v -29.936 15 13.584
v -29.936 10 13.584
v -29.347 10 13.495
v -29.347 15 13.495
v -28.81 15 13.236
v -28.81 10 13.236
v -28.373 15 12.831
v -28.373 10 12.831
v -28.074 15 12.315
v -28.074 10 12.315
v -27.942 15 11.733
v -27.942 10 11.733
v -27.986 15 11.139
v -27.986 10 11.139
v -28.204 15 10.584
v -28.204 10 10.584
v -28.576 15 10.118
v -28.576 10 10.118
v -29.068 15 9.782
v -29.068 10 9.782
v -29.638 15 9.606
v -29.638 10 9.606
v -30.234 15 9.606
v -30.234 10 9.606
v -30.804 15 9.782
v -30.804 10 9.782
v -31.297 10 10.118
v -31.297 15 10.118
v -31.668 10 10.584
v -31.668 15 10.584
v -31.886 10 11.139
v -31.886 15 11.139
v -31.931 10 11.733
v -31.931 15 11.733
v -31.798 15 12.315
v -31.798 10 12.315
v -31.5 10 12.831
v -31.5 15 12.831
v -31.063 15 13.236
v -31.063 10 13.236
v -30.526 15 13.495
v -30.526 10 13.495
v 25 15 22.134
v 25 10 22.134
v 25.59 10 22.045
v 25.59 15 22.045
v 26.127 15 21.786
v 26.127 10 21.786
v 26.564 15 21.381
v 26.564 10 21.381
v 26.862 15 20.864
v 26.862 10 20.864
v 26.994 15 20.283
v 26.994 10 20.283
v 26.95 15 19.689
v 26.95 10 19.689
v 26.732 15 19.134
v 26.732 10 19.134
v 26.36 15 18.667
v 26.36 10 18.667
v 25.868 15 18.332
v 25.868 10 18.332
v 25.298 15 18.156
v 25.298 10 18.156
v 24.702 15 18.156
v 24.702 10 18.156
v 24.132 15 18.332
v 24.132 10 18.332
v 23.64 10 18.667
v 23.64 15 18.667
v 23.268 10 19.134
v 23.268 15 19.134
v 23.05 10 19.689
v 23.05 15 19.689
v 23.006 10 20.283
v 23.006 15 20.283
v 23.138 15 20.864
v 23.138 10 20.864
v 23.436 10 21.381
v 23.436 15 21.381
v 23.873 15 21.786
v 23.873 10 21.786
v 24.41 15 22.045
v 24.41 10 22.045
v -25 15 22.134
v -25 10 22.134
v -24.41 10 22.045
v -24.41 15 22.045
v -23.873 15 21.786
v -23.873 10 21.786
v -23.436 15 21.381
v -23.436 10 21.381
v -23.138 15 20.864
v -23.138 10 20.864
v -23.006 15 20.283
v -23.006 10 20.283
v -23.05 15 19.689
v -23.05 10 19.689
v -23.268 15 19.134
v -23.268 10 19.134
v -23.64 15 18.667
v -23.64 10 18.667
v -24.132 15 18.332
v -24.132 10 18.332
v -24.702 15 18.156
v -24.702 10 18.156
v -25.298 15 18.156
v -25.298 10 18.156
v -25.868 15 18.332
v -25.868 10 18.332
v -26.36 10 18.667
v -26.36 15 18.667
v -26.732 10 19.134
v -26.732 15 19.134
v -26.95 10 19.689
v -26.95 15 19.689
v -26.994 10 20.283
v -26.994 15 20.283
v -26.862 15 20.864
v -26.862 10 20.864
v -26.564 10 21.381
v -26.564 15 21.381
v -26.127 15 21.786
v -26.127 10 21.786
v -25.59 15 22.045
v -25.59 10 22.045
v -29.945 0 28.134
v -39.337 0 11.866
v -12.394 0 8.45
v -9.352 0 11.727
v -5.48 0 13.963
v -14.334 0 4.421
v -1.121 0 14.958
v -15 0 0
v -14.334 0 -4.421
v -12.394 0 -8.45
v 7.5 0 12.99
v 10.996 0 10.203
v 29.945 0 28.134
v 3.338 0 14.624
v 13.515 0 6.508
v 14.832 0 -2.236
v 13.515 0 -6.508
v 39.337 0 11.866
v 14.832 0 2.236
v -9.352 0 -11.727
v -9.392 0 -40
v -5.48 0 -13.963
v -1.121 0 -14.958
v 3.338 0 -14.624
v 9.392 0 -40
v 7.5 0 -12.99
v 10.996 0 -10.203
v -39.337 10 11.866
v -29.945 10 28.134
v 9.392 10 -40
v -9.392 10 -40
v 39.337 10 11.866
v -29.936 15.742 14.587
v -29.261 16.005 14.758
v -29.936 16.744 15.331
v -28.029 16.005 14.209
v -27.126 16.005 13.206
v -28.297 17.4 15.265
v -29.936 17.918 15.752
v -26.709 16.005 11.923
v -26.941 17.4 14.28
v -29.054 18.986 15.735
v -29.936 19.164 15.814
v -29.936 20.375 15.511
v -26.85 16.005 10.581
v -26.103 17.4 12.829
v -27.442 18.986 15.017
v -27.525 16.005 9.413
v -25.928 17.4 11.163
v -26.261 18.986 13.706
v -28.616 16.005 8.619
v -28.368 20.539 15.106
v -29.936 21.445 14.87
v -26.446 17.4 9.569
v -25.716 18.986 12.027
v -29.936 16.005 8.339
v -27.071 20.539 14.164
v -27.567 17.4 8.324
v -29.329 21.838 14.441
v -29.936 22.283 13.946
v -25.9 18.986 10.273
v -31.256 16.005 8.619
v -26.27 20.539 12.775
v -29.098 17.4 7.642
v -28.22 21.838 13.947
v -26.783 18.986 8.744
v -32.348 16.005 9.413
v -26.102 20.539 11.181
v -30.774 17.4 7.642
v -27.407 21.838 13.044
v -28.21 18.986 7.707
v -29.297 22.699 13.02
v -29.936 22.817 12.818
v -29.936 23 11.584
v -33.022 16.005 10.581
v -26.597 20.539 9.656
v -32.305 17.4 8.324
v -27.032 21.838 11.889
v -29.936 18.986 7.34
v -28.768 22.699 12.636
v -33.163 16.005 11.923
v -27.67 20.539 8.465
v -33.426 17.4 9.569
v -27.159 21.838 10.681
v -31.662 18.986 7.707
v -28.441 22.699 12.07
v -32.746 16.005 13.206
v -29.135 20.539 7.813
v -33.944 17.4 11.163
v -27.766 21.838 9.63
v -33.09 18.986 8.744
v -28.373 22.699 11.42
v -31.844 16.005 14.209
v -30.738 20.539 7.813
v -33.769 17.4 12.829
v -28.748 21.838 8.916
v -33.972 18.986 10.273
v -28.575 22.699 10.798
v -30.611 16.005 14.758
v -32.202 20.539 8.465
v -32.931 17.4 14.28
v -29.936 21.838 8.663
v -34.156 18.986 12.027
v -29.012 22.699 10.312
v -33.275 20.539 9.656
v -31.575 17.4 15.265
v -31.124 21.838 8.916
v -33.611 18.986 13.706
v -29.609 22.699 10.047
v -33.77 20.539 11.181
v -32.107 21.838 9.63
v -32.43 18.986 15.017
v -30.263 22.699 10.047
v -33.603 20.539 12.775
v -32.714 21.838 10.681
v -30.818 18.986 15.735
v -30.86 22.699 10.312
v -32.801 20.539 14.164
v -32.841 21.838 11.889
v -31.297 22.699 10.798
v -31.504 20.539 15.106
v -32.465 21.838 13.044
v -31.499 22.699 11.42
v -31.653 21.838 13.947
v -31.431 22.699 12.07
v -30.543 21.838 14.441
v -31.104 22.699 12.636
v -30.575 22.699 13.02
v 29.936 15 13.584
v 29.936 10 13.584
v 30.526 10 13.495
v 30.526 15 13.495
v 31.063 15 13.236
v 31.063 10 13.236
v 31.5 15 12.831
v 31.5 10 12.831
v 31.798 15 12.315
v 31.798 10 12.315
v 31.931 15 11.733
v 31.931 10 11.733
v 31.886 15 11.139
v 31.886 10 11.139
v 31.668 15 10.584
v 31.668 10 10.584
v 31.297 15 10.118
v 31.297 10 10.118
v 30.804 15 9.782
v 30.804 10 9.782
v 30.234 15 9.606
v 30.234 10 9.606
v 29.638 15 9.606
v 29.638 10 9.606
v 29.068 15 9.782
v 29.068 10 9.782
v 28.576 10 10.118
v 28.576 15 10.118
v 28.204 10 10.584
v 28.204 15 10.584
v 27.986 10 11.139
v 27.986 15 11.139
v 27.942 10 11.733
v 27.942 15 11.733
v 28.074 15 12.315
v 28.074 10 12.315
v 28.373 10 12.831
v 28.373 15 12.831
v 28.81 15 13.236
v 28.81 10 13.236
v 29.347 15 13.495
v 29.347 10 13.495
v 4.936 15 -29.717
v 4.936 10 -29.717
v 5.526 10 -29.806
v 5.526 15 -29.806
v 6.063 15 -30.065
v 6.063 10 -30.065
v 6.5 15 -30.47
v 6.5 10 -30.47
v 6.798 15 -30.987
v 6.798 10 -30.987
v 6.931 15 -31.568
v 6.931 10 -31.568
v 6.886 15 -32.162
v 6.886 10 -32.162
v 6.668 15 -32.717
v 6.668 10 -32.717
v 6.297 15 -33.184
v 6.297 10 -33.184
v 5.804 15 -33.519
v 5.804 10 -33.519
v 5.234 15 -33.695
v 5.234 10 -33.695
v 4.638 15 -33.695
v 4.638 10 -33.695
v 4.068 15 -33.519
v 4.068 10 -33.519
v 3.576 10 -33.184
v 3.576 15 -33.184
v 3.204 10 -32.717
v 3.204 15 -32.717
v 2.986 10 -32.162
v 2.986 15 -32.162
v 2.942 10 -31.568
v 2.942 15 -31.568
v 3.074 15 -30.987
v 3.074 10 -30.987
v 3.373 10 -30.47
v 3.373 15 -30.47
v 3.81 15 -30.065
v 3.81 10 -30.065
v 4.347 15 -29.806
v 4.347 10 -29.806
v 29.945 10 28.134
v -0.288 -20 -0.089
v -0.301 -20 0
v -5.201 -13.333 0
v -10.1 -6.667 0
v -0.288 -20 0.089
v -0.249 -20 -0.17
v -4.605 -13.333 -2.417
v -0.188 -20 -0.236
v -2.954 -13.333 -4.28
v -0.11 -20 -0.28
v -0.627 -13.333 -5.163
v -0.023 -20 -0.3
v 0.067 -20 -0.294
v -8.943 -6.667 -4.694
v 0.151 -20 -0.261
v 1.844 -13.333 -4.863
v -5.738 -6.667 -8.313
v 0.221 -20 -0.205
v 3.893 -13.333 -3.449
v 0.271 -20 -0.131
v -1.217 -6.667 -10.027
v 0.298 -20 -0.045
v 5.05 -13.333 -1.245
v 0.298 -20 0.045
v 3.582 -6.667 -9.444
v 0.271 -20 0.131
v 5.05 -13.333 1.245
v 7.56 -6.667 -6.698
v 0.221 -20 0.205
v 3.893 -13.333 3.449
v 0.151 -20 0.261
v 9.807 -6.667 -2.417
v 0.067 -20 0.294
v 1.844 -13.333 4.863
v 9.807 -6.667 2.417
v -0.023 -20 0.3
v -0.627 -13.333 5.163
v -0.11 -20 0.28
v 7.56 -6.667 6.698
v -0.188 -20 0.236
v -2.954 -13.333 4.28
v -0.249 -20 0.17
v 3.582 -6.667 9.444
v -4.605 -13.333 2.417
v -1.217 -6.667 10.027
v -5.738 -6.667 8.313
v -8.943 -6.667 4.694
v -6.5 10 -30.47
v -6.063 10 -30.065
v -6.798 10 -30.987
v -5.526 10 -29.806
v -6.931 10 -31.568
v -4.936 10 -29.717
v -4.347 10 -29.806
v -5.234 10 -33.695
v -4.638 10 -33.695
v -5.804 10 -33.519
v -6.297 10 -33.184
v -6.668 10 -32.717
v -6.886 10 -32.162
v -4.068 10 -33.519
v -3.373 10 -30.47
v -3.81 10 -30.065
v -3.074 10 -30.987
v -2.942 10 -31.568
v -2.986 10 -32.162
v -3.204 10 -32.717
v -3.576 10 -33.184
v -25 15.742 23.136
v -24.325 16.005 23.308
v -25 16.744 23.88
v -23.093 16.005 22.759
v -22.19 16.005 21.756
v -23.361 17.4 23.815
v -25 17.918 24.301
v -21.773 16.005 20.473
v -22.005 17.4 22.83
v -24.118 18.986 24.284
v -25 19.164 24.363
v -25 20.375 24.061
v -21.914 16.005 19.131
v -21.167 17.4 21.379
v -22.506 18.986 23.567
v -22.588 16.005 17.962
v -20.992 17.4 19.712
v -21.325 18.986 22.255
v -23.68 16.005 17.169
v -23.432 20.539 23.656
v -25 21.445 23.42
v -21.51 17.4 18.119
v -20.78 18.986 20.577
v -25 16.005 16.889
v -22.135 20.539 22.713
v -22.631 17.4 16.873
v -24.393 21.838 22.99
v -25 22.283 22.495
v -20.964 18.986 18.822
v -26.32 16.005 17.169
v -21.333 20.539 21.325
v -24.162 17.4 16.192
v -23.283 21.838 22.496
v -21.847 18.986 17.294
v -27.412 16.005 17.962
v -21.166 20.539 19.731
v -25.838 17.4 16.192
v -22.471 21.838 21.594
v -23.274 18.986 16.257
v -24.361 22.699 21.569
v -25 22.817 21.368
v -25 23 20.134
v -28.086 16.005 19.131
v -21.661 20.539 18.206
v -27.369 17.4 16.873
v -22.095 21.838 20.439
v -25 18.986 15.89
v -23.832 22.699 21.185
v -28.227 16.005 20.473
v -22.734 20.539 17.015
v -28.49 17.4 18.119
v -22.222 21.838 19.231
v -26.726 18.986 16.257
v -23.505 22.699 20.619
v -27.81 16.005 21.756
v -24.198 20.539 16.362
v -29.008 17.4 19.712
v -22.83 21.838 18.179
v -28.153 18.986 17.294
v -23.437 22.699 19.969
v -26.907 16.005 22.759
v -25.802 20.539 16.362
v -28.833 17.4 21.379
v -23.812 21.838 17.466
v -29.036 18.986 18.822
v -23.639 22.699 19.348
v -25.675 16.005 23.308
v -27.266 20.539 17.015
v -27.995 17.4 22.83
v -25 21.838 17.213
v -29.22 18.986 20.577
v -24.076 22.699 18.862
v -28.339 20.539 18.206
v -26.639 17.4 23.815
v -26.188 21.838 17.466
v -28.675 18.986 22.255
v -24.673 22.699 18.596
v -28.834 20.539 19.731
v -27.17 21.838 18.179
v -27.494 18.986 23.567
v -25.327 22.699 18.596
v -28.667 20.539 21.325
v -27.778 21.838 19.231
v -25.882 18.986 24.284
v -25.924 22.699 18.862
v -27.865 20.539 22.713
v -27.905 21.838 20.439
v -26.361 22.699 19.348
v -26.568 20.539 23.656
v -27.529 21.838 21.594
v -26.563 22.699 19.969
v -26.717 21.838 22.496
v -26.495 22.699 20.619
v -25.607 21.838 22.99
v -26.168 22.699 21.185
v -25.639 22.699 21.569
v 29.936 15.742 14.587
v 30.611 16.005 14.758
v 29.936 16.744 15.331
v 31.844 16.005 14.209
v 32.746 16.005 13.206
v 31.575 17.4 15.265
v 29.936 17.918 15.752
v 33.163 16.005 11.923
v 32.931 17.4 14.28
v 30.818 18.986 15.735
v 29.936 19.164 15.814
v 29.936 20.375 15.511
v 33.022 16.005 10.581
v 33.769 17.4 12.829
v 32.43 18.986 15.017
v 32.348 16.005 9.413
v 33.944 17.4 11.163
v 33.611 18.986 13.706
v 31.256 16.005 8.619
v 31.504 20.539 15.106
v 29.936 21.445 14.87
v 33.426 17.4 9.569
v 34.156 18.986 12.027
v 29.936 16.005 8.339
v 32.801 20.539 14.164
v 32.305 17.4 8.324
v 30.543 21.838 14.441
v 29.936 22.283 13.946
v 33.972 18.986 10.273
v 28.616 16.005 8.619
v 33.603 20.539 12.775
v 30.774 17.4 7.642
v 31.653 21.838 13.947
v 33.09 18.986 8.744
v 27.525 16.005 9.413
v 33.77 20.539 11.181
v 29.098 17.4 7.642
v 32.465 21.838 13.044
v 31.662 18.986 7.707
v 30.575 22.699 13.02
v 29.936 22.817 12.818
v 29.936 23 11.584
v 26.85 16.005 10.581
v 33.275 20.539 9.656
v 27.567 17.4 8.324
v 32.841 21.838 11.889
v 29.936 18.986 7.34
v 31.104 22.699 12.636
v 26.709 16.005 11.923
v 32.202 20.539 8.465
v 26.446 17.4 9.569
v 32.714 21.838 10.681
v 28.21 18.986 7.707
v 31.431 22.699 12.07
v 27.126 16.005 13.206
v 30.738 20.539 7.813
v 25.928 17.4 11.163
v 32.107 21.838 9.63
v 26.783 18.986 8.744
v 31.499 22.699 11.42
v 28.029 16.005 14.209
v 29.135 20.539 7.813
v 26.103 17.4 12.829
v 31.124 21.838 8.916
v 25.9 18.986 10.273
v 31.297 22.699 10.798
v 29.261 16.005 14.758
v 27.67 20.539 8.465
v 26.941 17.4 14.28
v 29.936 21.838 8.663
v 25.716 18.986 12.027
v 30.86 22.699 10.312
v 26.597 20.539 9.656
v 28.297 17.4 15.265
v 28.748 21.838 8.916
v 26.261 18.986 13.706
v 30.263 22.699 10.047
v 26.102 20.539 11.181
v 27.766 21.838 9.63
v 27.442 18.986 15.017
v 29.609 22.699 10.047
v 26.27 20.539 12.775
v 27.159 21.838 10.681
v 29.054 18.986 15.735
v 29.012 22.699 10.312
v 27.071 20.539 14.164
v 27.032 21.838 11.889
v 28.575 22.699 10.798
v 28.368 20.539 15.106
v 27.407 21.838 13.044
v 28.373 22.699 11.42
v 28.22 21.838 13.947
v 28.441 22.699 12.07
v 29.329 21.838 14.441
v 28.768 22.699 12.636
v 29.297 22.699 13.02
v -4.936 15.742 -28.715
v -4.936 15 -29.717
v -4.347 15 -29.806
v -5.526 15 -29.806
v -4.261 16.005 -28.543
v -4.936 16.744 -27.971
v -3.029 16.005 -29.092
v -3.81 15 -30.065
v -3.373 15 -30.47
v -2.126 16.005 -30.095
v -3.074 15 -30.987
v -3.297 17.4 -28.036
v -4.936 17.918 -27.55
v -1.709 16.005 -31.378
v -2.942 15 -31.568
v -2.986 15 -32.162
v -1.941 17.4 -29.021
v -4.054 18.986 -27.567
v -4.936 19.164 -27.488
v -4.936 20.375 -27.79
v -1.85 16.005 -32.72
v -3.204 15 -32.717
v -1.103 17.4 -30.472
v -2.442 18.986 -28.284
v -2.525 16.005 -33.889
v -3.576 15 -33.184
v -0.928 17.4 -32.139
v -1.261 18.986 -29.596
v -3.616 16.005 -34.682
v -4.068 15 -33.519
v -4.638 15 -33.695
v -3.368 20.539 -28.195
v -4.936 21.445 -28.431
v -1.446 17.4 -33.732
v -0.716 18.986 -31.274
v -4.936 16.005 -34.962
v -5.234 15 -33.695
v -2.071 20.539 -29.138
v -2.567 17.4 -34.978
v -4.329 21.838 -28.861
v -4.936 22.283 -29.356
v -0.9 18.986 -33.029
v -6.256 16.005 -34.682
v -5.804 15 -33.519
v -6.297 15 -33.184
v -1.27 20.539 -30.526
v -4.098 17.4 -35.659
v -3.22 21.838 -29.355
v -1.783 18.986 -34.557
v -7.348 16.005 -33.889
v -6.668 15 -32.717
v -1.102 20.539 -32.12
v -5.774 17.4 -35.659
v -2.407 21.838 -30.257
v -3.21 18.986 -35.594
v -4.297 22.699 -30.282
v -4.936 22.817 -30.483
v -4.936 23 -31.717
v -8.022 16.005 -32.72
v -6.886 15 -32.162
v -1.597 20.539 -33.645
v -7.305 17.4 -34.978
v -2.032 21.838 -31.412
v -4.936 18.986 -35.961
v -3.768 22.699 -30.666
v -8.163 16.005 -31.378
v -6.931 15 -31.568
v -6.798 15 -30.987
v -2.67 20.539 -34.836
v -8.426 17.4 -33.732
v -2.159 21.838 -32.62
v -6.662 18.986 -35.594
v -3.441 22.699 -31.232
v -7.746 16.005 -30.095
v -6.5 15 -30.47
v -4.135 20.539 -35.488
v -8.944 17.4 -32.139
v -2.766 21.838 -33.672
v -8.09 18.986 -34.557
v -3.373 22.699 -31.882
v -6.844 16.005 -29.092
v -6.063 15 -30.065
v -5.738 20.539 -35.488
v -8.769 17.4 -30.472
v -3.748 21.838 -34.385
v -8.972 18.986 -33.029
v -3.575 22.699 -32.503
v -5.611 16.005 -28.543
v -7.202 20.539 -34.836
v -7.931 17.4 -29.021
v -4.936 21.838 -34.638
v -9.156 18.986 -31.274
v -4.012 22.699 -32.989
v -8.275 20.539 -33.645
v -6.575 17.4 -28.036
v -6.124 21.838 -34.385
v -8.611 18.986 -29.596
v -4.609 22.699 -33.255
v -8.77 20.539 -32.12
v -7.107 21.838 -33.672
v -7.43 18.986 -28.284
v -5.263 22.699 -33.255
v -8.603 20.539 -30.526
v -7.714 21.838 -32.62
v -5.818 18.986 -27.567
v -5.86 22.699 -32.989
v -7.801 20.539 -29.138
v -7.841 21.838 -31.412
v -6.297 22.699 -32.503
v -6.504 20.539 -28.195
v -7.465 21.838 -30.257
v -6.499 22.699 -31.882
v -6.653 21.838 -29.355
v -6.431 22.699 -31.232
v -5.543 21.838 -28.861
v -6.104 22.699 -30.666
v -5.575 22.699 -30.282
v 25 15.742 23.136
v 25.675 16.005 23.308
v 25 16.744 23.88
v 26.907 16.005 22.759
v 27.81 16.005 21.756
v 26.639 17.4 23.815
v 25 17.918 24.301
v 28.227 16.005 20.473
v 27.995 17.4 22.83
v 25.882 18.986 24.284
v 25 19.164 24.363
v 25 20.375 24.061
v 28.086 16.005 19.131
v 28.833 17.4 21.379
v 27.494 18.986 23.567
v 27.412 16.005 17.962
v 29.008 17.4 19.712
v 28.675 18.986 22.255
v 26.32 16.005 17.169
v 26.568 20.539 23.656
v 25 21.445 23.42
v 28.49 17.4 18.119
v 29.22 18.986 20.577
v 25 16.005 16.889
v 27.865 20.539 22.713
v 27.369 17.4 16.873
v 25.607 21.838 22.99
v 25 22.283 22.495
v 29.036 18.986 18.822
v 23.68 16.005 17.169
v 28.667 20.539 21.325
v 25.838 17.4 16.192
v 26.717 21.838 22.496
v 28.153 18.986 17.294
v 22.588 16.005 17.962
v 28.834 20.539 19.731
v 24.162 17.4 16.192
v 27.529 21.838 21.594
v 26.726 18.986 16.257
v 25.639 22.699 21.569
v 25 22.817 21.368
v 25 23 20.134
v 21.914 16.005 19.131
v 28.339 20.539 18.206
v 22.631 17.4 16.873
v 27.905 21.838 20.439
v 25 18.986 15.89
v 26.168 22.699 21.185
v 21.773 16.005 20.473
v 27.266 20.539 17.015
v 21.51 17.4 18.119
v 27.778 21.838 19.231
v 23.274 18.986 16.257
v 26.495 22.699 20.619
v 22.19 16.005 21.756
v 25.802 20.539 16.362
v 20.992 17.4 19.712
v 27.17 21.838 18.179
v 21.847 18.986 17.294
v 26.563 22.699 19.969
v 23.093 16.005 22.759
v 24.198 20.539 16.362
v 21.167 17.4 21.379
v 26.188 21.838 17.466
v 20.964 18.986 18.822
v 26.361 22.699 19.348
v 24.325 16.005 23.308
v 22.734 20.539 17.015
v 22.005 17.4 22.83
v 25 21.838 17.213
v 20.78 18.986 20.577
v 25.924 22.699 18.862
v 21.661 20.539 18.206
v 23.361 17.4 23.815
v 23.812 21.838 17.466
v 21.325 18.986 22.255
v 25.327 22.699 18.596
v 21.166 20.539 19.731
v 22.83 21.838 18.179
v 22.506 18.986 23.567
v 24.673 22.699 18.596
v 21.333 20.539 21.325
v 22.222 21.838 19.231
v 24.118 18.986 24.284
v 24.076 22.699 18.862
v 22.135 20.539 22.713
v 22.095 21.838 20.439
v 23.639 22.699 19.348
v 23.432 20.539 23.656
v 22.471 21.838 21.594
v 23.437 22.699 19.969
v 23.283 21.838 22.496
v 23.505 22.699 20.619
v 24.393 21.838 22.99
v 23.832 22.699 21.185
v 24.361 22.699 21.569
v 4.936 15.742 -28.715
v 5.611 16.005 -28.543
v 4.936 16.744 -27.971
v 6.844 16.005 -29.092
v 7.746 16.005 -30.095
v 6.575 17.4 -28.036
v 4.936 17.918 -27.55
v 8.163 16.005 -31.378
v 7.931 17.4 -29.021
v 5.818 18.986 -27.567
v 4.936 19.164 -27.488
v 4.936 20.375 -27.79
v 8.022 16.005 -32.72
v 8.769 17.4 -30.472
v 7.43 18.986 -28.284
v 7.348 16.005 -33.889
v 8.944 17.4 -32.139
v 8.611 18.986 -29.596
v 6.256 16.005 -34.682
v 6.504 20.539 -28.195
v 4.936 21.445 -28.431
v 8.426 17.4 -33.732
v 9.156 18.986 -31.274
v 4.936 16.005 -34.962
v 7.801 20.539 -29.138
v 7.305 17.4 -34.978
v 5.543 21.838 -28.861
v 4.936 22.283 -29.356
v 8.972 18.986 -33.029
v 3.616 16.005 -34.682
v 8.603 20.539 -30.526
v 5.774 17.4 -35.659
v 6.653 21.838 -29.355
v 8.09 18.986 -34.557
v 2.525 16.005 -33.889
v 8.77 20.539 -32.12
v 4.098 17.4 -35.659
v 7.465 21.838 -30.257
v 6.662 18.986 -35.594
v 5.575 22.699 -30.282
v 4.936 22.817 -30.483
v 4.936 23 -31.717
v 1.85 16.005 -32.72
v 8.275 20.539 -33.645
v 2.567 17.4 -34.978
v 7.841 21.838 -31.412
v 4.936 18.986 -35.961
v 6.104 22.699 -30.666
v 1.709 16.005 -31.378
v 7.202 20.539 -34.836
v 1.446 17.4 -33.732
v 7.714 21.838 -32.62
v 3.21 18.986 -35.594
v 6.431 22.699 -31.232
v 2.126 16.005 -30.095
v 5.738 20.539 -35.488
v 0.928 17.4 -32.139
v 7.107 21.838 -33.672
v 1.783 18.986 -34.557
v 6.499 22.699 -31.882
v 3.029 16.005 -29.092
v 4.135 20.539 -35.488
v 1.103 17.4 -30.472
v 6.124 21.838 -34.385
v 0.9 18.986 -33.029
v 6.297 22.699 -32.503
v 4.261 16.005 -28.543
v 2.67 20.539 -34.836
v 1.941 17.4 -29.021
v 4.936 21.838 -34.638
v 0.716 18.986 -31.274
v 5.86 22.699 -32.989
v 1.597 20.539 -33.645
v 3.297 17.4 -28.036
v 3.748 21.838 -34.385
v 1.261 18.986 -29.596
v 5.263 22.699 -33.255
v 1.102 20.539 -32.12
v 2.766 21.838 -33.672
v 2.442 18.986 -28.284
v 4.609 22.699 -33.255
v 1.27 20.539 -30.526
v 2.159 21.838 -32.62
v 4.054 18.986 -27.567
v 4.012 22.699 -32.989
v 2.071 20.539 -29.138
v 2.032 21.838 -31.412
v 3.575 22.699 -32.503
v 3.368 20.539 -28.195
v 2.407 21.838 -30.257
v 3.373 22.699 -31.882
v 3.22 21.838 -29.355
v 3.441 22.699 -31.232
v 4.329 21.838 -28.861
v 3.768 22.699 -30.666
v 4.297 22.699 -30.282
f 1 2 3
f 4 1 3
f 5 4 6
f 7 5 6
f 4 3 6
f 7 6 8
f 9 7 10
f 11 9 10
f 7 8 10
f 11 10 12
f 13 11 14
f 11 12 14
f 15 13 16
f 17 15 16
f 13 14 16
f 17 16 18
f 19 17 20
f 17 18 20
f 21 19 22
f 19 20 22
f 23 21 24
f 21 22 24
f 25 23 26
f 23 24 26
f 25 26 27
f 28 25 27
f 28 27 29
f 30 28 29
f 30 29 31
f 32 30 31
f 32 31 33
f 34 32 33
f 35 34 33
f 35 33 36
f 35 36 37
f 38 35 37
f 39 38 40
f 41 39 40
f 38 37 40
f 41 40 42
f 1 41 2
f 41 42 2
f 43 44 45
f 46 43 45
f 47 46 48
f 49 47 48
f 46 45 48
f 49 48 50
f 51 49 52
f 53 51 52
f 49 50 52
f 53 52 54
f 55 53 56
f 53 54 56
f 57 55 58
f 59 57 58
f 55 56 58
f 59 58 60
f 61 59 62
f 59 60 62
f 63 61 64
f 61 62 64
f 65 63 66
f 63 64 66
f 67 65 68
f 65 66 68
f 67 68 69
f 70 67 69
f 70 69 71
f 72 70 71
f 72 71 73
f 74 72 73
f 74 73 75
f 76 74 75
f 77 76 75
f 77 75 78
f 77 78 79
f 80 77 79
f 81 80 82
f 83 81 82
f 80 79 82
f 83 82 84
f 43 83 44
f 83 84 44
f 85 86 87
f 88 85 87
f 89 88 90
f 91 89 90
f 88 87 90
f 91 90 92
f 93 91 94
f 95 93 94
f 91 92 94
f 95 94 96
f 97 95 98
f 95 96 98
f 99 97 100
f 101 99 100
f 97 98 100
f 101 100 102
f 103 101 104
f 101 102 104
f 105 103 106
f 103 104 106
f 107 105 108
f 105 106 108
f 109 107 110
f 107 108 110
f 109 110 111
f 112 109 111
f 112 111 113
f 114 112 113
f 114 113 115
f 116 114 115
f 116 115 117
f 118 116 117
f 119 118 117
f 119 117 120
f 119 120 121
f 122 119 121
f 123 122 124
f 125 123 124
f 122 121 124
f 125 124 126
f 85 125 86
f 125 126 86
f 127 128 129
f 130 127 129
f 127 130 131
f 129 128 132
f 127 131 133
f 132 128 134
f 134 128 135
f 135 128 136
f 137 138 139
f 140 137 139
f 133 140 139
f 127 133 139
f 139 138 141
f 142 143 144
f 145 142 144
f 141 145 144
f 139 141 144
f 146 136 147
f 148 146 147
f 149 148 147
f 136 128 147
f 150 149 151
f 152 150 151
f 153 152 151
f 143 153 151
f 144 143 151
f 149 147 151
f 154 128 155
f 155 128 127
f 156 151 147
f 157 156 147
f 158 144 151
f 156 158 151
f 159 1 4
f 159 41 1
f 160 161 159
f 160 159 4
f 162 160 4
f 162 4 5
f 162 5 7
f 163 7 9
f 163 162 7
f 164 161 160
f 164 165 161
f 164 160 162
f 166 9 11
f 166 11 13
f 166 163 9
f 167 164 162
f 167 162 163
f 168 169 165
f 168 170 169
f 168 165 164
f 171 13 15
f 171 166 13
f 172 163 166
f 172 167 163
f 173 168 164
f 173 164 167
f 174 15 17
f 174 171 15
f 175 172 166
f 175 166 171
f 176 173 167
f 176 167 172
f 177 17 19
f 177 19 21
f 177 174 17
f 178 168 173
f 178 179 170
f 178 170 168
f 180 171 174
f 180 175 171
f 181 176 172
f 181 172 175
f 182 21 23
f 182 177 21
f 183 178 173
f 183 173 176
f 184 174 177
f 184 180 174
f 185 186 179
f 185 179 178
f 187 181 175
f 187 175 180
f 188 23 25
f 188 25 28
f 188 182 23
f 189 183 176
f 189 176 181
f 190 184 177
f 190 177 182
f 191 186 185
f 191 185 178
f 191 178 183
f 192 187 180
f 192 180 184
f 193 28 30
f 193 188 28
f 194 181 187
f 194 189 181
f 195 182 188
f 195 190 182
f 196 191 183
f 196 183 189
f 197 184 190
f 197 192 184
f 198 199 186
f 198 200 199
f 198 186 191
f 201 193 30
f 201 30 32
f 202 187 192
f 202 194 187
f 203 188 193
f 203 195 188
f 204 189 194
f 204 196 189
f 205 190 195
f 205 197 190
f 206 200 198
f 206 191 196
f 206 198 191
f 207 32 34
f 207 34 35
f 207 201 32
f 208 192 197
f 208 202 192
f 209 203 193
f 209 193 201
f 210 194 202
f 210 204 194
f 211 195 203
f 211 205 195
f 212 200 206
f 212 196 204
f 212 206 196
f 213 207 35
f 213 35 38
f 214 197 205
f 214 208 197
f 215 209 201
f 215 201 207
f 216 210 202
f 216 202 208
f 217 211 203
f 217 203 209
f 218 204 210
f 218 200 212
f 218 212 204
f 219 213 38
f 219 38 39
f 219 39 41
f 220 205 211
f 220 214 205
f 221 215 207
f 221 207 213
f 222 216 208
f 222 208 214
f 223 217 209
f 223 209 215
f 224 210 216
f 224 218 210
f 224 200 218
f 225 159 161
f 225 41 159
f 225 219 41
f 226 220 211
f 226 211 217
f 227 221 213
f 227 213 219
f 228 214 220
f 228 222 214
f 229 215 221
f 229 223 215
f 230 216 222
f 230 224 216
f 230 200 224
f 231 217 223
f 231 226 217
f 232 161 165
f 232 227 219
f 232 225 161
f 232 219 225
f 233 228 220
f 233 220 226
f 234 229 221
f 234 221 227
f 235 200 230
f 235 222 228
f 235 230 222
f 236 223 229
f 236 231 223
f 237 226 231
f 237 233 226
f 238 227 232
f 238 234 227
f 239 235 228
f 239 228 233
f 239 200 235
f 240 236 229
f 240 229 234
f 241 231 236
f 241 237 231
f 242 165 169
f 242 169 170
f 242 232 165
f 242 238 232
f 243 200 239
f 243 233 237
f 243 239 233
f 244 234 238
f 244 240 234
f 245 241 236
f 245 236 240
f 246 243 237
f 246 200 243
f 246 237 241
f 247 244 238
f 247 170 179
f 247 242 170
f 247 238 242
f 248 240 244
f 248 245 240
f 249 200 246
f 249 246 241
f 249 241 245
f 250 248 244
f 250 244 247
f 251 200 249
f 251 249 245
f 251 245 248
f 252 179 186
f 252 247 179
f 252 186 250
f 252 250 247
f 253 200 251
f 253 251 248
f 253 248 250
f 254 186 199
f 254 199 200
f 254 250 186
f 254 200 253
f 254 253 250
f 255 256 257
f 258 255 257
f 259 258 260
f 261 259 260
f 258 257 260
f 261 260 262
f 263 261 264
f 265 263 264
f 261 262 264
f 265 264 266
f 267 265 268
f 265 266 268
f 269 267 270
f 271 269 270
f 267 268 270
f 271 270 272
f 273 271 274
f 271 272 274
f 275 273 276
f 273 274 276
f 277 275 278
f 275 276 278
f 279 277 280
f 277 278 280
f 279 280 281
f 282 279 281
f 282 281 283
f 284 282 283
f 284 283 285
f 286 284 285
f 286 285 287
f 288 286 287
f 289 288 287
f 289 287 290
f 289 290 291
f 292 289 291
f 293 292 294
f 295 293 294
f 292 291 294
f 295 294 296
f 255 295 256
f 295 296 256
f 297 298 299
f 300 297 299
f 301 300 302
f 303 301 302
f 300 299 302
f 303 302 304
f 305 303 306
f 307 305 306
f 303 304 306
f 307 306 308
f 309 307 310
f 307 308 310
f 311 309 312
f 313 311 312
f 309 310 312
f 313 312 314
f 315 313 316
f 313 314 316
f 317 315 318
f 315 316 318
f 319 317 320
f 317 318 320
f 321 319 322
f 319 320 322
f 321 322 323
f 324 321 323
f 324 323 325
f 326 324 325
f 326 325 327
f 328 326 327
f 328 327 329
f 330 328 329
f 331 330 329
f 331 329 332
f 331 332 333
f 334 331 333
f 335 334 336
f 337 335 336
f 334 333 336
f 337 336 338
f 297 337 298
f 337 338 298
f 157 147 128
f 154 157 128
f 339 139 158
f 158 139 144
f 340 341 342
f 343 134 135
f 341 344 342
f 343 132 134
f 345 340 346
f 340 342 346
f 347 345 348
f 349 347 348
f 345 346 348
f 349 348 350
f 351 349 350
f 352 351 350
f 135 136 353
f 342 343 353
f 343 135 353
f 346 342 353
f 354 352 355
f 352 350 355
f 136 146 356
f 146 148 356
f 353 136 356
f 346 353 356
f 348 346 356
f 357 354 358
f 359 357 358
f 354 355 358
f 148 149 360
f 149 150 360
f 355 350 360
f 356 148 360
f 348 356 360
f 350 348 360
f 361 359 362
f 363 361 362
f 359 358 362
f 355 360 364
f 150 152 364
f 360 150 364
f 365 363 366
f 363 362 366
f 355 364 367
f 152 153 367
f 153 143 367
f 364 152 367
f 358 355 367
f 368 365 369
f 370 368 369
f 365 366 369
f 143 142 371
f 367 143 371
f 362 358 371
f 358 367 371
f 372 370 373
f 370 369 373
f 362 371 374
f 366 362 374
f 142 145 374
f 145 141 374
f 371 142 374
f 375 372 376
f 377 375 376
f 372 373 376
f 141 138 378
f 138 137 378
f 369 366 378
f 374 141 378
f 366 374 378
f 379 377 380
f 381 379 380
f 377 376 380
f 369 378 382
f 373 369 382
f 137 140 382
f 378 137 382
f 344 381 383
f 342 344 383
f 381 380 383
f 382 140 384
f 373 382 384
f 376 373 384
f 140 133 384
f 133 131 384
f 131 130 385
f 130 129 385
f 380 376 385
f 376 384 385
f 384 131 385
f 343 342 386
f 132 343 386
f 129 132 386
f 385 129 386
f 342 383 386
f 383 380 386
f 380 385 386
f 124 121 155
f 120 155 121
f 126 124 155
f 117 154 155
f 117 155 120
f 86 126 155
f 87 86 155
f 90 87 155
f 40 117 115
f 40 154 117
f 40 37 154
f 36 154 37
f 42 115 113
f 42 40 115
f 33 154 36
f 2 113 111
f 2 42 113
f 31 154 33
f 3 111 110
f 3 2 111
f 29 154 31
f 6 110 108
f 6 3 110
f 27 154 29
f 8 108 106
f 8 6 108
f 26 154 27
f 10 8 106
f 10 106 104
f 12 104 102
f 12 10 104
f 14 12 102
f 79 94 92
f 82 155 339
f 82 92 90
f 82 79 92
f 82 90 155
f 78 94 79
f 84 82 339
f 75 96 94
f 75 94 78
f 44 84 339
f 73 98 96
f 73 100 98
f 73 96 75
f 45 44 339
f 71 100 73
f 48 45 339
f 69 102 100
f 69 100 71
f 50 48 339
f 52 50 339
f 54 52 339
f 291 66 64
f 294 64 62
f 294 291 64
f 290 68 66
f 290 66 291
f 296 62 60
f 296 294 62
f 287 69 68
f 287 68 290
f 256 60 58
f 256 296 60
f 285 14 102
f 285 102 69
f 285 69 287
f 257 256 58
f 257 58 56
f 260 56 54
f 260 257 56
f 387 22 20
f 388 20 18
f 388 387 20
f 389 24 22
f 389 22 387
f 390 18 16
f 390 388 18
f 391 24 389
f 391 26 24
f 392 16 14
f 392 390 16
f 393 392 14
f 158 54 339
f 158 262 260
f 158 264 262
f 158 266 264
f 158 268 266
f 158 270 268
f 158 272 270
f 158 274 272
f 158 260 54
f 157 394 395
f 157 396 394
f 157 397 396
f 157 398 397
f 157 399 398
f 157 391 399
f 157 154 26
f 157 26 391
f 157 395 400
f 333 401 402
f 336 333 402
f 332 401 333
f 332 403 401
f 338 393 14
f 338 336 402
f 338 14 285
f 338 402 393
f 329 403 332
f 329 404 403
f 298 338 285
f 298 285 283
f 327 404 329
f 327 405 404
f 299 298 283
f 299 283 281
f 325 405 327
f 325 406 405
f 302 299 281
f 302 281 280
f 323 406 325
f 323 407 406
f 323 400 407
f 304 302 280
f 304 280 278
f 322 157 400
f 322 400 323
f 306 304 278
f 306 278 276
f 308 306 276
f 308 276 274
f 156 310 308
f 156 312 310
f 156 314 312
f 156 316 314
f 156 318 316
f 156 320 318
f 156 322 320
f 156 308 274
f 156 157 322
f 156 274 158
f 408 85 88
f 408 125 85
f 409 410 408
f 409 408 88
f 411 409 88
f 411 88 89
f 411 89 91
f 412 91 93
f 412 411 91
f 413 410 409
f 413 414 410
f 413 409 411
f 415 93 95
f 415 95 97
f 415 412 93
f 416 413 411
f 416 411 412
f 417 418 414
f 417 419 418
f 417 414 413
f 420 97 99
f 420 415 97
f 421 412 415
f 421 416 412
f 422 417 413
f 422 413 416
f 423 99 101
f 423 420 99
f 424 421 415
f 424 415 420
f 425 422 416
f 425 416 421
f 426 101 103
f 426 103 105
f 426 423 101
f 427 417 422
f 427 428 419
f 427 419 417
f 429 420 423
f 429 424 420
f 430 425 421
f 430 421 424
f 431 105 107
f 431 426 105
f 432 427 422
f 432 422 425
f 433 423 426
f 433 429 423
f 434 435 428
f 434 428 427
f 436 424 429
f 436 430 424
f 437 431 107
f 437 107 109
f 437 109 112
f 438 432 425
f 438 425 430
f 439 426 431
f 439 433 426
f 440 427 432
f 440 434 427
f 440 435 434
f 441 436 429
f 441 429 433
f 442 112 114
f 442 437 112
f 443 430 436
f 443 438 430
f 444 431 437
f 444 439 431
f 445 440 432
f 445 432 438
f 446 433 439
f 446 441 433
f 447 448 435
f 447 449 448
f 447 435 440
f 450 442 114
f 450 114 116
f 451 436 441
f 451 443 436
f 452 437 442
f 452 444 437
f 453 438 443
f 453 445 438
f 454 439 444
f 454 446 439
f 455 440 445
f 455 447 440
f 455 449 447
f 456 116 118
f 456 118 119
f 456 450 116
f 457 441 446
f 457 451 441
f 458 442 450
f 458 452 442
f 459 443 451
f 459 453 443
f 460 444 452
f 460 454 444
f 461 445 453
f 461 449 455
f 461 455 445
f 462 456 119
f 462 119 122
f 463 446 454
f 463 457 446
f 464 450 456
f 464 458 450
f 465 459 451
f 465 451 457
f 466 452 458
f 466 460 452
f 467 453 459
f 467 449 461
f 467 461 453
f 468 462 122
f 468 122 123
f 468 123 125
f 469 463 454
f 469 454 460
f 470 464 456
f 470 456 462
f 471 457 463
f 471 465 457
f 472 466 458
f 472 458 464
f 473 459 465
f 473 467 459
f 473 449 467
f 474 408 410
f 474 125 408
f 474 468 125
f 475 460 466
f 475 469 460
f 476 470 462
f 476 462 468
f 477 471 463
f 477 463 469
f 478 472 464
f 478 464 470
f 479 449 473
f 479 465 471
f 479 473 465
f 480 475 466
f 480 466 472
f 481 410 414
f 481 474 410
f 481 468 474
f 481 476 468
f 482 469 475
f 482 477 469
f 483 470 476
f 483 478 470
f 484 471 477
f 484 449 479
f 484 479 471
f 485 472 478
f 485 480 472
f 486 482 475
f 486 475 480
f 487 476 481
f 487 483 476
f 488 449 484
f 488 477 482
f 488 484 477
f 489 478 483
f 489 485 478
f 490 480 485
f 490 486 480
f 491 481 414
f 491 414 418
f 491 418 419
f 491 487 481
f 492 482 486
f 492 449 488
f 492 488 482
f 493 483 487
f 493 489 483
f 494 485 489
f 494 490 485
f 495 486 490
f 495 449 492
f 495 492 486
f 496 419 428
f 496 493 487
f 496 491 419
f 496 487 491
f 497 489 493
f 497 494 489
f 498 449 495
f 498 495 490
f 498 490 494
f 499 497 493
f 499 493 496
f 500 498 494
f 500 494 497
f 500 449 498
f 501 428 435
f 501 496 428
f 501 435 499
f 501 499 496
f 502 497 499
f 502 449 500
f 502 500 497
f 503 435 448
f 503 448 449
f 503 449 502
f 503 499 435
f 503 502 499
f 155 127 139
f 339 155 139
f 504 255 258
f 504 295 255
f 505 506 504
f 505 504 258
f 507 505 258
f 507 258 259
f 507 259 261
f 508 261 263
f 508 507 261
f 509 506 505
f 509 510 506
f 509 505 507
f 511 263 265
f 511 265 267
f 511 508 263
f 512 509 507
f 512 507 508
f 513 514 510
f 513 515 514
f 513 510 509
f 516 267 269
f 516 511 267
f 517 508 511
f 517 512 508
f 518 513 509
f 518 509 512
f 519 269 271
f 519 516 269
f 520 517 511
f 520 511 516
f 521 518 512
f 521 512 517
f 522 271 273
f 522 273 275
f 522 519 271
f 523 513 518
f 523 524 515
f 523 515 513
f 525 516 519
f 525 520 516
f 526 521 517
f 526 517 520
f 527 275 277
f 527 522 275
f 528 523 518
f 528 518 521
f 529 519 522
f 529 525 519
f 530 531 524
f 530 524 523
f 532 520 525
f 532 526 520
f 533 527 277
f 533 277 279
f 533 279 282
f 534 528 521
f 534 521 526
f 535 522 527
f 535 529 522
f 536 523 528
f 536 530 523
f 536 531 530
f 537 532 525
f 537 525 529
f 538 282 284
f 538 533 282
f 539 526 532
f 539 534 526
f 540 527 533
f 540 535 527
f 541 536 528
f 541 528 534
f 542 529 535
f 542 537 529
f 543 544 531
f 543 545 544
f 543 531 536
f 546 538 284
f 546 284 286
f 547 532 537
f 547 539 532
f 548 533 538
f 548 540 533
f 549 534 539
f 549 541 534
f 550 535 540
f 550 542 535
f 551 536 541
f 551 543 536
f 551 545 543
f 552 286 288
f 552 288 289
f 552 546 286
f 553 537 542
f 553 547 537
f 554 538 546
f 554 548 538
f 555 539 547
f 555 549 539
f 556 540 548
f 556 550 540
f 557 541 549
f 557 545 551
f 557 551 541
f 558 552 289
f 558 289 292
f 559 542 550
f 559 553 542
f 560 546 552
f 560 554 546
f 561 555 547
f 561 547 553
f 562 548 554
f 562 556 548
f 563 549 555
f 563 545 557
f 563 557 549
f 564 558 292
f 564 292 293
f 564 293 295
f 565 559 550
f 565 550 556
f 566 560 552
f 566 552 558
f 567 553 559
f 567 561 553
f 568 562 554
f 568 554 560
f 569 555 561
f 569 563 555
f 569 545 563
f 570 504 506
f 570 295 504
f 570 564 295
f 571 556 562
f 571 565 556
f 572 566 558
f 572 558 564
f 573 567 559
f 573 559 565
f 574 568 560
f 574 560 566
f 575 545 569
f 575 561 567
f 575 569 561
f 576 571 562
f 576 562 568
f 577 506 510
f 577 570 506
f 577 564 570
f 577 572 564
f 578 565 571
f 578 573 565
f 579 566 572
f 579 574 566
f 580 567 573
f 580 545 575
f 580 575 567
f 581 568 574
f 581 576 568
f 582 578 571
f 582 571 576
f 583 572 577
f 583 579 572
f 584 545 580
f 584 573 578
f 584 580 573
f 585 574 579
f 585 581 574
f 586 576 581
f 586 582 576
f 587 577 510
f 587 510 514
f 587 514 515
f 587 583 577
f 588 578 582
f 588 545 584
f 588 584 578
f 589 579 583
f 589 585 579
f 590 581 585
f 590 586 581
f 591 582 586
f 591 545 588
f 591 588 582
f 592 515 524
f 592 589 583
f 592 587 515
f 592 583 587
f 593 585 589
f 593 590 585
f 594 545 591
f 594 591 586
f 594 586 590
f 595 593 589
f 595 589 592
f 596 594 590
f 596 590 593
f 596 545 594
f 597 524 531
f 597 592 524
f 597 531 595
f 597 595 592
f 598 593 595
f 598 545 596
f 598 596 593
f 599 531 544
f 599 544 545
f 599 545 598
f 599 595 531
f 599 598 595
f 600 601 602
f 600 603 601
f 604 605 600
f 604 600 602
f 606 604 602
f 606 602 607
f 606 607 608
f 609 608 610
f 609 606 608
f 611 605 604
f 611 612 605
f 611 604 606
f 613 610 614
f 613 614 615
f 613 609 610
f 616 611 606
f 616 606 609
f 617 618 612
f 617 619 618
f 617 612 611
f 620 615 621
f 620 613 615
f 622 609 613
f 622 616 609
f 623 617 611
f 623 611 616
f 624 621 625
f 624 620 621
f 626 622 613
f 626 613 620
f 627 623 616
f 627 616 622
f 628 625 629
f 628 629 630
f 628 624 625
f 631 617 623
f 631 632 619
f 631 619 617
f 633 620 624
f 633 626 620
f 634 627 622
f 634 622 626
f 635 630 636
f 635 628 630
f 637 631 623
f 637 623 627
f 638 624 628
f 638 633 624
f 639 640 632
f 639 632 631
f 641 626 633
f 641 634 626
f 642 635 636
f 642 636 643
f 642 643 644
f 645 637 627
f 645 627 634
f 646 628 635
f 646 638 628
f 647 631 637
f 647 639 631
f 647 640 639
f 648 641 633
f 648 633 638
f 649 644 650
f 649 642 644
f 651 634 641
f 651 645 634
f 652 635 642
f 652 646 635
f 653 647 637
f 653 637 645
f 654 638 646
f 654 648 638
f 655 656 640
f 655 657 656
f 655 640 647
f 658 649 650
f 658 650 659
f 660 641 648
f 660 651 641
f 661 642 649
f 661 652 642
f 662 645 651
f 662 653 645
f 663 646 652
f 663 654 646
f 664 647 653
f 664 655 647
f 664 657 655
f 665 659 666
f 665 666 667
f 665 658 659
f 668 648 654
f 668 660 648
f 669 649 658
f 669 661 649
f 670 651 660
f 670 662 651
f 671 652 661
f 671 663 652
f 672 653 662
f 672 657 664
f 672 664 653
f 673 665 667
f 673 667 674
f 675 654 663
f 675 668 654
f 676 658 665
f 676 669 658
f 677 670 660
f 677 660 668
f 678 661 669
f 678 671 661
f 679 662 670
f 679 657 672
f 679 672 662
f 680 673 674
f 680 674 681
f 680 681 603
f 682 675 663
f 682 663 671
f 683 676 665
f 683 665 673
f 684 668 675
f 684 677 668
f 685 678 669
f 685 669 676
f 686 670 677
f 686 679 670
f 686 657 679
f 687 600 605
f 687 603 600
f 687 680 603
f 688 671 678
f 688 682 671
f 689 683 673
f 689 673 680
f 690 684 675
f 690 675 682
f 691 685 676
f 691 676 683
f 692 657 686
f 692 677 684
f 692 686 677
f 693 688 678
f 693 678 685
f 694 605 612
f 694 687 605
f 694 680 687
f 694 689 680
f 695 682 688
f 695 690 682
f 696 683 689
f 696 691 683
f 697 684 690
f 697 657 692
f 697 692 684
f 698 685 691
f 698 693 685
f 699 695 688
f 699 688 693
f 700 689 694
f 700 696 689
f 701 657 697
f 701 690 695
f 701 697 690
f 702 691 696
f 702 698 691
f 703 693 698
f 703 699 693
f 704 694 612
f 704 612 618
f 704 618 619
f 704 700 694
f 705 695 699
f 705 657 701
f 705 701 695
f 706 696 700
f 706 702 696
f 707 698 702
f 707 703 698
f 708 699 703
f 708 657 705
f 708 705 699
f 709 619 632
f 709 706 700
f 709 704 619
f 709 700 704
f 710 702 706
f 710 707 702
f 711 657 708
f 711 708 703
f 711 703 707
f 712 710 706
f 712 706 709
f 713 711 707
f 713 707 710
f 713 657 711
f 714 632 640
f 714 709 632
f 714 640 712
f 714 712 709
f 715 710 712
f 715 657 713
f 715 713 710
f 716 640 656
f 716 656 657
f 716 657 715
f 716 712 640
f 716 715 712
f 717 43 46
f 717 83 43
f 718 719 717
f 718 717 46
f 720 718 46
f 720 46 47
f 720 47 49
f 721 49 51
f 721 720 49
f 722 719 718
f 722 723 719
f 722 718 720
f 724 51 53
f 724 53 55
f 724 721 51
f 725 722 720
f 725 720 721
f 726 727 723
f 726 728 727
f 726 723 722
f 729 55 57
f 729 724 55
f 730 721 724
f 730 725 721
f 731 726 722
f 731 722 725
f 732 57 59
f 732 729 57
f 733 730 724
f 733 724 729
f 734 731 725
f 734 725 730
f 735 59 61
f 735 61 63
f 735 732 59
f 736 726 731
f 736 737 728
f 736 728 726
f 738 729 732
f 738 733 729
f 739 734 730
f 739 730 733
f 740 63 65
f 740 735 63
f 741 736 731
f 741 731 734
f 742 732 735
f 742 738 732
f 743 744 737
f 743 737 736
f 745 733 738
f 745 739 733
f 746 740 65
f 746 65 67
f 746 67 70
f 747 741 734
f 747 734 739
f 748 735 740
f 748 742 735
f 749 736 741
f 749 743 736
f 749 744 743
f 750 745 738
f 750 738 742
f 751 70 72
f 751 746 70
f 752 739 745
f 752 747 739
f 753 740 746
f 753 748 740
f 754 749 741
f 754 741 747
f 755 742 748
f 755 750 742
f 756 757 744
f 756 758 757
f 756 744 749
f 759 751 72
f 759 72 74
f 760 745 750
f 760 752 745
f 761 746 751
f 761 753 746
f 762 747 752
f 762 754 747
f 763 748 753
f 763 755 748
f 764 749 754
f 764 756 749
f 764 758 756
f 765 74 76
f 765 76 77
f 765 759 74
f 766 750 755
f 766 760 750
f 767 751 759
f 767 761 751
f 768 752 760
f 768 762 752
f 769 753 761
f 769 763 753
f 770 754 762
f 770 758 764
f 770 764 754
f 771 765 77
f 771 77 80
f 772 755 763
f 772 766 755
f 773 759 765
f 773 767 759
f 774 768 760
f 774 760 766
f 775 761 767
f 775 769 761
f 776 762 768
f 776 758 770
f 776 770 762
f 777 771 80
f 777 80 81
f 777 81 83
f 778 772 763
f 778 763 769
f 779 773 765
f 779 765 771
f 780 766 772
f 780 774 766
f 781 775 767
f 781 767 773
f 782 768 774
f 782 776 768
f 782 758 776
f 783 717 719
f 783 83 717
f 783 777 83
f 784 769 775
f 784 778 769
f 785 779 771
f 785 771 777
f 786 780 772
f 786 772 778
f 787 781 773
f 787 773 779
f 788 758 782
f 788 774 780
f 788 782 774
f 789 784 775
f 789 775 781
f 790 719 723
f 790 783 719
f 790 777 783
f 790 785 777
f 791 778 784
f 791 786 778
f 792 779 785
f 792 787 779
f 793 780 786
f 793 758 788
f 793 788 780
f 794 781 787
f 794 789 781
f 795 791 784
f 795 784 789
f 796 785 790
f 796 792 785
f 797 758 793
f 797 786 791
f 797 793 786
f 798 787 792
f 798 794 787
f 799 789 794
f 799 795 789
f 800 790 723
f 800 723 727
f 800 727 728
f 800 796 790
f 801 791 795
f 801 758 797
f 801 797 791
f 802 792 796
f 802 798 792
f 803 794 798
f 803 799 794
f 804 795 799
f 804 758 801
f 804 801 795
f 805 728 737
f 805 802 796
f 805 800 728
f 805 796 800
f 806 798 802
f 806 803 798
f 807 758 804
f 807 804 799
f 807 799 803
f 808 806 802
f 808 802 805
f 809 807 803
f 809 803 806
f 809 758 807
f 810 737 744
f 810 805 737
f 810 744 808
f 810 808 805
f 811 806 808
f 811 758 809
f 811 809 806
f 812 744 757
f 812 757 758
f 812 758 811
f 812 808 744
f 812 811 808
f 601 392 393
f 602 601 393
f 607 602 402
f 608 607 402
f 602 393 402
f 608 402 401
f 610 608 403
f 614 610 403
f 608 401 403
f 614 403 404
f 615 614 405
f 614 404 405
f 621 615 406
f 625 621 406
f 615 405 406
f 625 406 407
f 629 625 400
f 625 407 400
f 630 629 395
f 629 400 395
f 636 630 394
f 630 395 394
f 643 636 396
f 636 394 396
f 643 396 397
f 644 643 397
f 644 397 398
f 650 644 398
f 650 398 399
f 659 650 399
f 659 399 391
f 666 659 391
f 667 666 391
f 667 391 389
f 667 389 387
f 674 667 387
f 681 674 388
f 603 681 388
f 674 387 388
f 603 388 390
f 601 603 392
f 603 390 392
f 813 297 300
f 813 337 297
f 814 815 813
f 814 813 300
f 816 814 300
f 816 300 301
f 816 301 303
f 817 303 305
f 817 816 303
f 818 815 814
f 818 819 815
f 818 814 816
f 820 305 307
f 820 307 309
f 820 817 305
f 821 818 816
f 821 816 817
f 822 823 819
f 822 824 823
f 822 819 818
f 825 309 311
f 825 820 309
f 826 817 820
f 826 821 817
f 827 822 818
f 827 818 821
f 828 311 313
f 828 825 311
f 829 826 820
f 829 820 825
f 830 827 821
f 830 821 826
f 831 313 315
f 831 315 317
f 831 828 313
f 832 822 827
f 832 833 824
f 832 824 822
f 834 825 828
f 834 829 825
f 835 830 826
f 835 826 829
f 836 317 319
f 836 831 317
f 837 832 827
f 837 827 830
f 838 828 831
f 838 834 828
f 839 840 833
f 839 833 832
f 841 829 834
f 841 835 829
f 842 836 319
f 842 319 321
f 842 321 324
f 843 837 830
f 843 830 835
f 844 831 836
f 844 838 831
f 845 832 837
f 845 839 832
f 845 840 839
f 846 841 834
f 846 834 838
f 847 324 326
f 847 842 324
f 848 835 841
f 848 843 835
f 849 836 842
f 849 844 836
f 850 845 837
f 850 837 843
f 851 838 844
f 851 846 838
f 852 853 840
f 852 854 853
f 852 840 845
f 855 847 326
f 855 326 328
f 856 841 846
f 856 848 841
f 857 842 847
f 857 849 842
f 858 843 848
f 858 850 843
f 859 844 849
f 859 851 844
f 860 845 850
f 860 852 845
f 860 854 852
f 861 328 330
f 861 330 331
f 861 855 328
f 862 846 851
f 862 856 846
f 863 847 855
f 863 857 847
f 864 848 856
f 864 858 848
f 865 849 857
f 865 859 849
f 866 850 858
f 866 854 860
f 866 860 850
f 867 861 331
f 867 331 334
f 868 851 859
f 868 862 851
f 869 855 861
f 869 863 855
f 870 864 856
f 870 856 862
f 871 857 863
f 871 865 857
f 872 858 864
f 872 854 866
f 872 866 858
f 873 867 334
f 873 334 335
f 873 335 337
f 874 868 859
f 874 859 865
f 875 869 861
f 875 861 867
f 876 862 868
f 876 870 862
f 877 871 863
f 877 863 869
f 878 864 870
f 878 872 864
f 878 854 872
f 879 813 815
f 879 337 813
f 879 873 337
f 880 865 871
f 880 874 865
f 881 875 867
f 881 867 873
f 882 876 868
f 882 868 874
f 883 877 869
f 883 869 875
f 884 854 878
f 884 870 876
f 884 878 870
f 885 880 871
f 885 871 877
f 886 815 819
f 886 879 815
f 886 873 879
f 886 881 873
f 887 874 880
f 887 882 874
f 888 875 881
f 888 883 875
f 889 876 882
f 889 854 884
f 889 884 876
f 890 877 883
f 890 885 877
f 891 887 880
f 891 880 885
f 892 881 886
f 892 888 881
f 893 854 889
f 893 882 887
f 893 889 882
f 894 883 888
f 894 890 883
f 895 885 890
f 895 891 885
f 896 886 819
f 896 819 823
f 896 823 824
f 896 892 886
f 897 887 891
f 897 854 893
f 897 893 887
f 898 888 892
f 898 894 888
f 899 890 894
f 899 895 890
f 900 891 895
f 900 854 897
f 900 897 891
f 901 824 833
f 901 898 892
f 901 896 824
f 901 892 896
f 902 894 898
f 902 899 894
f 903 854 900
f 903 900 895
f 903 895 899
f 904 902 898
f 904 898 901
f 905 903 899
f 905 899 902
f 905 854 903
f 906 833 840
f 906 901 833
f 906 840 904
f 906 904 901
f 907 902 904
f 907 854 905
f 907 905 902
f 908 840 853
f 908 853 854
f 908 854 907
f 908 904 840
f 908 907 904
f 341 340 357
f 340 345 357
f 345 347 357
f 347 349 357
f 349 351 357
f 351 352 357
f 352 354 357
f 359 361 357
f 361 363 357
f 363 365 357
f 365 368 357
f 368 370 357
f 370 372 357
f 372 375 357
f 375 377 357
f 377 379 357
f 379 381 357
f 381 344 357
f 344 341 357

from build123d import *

# Parameters (mm, degrees)
BOSS_EXTRUDE1_DEPTH = 10
SKETCH3_R           = 2
BOSS_EXTRUDE2_DEPTH = 5
DOME1_FACE_RADIUS   = 2
DOME1_HEIGHT        = 8
DOME2_FACE_RADIUS   = 2
DOME2_HEIGHT        = 8
DOME3_FACE_RADIUS   = 2
DOME3_HEIGHT        = 8
DOME4_FACE_RADIUS   = 2
DOME4_HEIGHT        = 8
DOME5_FACE_RADIUS   = 2
DOME5_HEIGHT        = 8
DOME6_FACE_RADIUS   = 2
DOME6_HEIGHT        = 8


with BuildPart() as part:
    # Sketch1 → Boss-Extrude1 (new body)
    with BuildSketch(Plane(origin=(0, 0, 0), x_dir=(1, 0, 0), z_dir=(0, 1, 0))):
        Polygon((-9.391819351, 40), (-39.336925827, -11.866445855), (-29.945106476, -28.133554145), (29.945106476, -28.133554145), (39.336925827, -11.866445855), (9.391819351, 40), align=None)
    extrude(amount=BOSS_EXTRUDE1_DEPTH)

    # Sketch2 → Revolve1 (revolve)
    with BuildSketch(Plane.XY):
        Polygon((-0.301325351, -20), (-15, 0), (0, 0), (0, -20), align=None)
    revolve(axis=Axis((0, 0, 0), (0, -1, 0)))

    # Sketch3 → Boss-Extrude2 (add)
    with BuildSketch(Plane(origin=(0, 10, 0), x_dir=(1, 0, 0), z_dir=(0, 1, 0))):
        with Locations(Location((-4.936169358, 31.717412167, 0), (0, 0, 270))):
            Circle(SKETCH3_R)
        with Locations(Location((-29.936169358, -11.583858022, 0), (0, 0, 270))):
            Circle(SKETCH3_R)
        with Locations(Location((4.936169358, 31.717412167, 0), (0, 0, 270))):
            Circle(SKETCH3_R)
        with Locations(Location((29.936169358, -11.583858022, 0), (0, 0, 270))):
            Circle(SKETCH3_R)
        with Locations(Location((25, -20.133554145, 0), (0, 0, 270))):
            Circle(SKETCH3_R)
        with Locations(Location((-25, -20.133554145, 0), (0, 0, 270))):
            Circle(SKETCH3_R)
    extrude(amount=BOSS_EXTRUDE2_DEPTH)

    # Dome1: a dome of height H over a round flat face of radius A is a cap of a sphere of radius (A * A + H * H) / (2 * H)
    dome1_r = (DOME1_FACE_RADIUS * DOME1_FACE_RADIUS + DOME1_HEIGHT * DOME1_HEIGHT) / (2 * DOME1_HEIGHT)
    dome1_base = Plane((-29.936169358, 15, 11.583858022), z_dir=(0, 1, 0))
    with Locations(dome1_base.offset(DOME1_HEIGHT - dome1_r)):
        dome1_ball = Sphere(dome1_r, mode=Mode.PRIVATE)
    add(split(dome1_ball, bisect_by=dome1_base, keep=Keep.TOP, mode=Mode.PRIVATE))

    # Dome2: a dome of height H over a round flat face of radius A is a cap of a sphere of radius (A * A + H * H) / (2 * H)
    dome2_r = (DOME2_FACE_RADIUS * DOME2_FACE_RADIUS + DOME2_HEIGHT * DOME2_HEIGHT) / (2 * DOME2_HEIGHT)
    dome2_base = Plane((-4.936169358, 15, -31.717412167), z_dir=(0, 1, 0))
    with Locations(dome2_base.offset(DOME2_HEIGHT - dome2_r)):
        dome2_ball = Sphere(dome2_r, mode=Mode.PRIVATE)
    add(split(dome2_ball, bisect_by=dome2_base, keep=Keep.TOP, mode=Mode.PRIVATE))

    # Dome3: a dome of height H over a round flat face of radius A is a cap of a sphere of radius (A * A + H * H) / (2 * H)
    dome3_r = (DOME3_FACE_RADIUS * DOME3_FACE_RADIUS + DOME3_HEIGHT * DOME3_HEIGHT) / (2 * DOME3_HEIGHT)
    dome3_base = Plane((4.936169358, 15, -31.717412167), z_dir=(0, 1, 0))
    with Locations(dome3_base.offset(DOME3_HEIGHT - dome3_r)):
        dome3_ball = Sphere(dome3_r, mode=Mode.PRIVATE)
    add(split(dome3_ball, bisect_by=dome3_base, keep=Keep.TOP, mode=Mode.PRIVATE))

    # Dome4: a dome of height H over a round flat face of radius A is a cap of a sphere of radius (A * A + H * H) / (2 * H)
    dome4_r = (DOME4_FACE_RADIUS * DOME4_FACE_RADIUS + DOME4_HEIGHT * DOME4_HEIGHT) / (2 * DOME4_HEIGHT)
    dome4_base = Plane((29.936169358, 15, 11.583858022), z_dir=(0, 1, 0))
    with Locations(dome4_base.offset(DOME4_HEIGHT - dome4_r)):
        dome4_ball = Sphere(dome4_r, mode=Mode.PRIVATE)
    add(split(dome4_ball, bisect_by=dome4_base, keep=Keep.TOP, mode=Mode.PRIVATE))

    # Dome5: a dome of height H over a round flat face of radius A is a cap of a sphere of radius (A * A + H * H) / (2 * H)
    dome5_r = (DOME5_FACE_RADIUS * DOME5_FACE_RADIUS + DOME5_HEIGHT * DOME5_HEIGHT) / (2 * DOME5_HEIGHT)
    dome5_base = Plane((25, 15, 20.133554145), z_dir=(0, 1, 0))
    with Locations(dome5_base.offset(DOME5_HEIGHT - dome5_r)):
        dome5_ball = Sphere(dome5_r, mode=Mode.PRIVATE)
    add(split(dome5_ball, bisect_by=dome5_base, keep=Keep.TOP, mode=Mode.PRIVATE))

    # Dome6: a dome of height H over a round flat face of radius A is a cap of a sphere of radius (A * A + H * H) / (2 * H)
    dome6_r = (DOME6_FACE_RADIUS * DOME6_FACE_RADIUS + DOME6_HEIGHT * DOME6_HEIGHT) / (2 * DOME6_HEIGHT)
    dome6_base = Plane((-25, 15, 20.133554145), z_dir=(0, 1, 0))
    with Locations(dome6_base.offset(DOME6_HEIGHT - dome6_r)):
        dome6_ball = Sphere(dome6_r, mode=Mode.PRIVATE)
    add(split(dome6_ball, bisect_by=dome6_base, keep=Keep.TOP, mode=Mode.PRIVATE))


solid = part.part
